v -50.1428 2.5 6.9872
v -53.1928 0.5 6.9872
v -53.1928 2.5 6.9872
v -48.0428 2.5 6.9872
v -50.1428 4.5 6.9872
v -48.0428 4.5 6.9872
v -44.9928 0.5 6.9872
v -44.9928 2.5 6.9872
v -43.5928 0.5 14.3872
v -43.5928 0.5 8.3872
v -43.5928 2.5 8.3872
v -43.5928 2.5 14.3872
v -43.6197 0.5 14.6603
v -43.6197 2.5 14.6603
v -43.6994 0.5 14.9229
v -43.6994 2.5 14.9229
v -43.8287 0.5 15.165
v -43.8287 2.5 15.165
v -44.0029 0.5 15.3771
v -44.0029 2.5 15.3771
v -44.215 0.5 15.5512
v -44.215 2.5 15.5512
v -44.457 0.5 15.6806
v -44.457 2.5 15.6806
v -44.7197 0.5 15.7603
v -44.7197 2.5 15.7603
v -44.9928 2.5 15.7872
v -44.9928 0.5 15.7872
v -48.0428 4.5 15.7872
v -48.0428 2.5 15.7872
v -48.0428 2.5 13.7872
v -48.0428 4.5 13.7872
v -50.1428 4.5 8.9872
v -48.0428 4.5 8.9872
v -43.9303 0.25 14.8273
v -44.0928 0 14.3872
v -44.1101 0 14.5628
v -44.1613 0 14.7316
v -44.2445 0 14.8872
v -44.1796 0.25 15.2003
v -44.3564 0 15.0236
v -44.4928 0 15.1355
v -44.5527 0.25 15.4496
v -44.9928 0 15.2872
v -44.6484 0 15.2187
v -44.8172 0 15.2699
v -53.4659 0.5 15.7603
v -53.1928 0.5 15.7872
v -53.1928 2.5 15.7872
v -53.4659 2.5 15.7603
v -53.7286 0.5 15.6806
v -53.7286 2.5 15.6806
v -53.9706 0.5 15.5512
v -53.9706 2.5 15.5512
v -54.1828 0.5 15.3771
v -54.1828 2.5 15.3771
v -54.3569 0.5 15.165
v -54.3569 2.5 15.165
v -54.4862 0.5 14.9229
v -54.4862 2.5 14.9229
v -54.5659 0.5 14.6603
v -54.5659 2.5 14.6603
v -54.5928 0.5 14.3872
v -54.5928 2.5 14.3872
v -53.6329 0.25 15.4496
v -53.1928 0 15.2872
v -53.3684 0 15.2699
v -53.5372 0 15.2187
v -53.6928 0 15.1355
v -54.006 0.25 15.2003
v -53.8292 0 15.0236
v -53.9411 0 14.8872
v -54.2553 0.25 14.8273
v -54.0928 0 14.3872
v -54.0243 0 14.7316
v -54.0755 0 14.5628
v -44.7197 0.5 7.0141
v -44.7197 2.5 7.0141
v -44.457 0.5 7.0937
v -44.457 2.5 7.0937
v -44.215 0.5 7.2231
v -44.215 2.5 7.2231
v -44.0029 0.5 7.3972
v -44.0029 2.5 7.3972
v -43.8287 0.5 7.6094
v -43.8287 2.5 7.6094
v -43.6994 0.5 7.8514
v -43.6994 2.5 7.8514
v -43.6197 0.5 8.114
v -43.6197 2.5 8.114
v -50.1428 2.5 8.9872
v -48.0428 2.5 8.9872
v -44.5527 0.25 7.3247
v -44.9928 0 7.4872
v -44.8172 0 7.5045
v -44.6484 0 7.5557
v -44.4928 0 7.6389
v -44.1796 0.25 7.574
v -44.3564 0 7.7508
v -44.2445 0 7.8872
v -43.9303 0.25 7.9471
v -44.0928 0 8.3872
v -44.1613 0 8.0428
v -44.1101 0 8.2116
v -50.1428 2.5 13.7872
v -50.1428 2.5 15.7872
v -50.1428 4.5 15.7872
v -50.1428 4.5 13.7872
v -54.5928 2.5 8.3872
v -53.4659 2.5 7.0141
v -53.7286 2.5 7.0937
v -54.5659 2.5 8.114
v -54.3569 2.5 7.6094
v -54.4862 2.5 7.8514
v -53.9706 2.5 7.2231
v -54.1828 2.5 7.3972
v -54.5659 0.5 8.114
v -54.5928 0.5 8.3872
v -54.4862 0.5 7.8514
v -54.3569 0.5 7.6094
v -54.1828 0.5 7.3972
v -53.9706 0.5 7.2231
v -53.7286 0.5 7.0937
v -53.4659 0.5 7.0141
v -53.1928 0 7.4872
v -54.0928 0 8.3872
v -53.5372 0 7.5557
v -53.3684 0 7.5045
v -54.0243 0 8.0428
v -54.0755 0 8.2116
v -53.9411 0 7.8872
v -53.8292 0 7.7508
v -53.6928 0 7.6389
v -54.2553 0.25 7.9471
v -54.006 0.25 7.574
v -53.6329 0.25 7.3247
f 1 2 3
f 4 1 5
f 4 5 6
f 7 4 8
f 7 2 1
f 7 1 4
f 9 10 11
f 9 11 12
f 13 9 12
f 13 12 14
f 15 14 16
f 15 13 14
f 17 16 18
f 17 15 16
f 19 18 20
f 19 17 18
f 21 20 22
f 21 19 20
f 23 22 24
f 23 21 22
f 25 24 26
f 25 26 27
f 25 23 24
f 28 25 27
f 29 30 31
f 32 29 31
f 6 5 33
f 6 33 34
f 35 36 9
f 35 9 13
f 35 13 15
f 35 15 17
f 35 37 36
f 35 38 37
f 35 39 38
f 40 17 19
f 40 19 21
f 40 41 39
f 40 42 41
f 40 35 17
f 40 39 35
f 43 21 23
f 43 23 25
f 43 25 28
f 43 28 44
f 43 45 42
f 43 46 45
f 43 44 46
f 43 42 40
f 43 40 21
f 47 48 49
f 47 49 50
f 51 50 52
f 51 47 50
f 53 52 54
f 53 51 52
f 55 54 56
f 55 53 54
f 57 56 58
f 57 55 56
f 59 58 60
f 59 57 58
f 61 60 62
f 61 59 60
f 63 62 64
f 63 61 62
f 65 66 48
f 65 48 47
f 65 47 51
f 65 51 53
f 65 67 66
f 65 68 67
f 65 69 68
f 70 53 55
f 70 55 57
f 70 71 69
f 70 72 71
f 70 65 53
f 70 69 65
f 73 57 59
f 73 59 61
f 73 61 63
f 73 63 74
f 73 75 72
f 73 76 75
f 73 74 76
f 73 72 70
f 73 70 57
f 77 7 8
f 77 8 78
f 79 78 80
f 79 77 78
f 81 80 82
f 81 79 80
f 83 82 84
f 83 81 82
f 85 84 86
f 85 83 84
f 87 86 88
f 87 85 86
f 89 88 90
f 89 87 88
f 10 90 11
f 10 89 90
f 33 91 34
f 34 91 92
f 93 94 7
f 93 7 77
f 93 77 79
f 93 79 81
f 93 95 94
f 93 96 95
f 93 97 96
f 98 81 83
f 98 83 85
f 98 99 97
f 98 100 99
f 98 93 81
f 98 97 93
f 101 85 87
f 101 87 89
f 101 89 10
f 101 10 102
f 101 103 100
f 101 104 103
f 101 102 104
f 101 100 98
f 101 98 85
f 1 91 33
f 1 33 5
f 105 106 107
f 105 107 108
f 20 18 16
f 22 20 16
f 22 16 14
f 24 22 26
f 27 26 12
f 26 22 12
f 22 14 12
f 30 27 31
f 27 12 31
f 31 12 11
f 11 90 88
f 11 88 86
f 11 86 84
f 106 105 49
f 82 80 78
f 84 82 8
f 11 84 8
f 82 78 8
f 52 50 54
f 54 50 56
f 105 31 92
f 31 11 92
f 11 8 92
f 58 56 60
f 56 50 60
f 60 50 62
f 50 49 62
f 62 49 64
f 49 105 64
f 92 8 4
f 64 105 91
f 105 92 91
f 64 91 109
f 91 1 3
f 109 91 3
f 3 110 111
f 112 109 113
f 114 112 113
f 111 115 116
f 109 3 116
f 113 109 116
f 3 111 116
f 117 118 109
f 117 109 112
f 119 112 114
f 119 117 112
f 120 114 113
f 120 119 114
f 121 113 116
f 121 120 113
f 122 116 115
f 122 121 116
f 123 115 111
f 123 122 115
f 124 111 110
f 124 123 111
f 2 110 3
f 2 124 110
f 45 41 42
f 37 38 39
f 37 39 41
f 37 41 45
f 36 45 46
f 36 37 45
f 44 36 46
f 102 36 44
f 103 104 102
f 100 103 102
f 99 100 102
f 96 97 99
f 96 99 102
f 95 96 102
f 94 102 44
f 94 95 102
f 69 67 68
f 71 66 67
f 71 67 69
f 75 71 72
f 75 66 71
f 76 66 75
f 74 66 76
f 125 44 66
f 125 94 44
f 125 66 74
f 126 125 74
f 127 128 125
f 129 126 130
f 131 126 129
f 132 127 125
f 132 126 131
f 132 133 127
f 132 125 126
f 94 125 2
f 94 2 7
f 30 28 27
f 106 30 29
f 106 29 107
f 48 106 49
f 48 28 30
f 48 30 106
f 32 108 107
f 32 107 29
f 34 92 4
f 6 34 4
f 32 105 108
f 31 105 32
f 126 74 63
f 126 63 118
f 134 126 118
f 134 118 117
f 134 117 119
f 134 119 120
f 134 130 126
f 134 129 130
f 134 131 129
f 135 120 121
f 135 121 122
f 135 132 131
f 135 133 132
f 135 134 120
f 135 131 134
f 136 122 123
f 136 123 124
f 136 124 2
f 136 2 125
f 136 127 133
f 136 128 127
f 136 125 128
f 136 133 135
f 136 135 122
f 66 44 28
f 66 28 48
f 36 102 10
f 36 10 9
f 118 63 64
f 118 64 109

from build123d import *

# Parameters (mm, degrees)
EXTRUDE_1_DEPTH = 2.5
CHAMFER_1_SIZE  = 0.5
SKETCH_2_W      = 2.1
SKETCH_2_H      = 2
EXTRUDE_2_DEPTH = 2


with BuildPart() as part:
    # 草图1 → 凸台-拉伸1 (new body)
    with BuildSketch(Plane(origin=(0, 0, 0), x_dir=(1, 0, 0), z_dir=(0, 1, 0))):
        with BuildLine():
            Line((-53.192801429, -6.98717318), (-44.992801429, -6.98717318))
            ThreePointArc((-44.992801429, -6.98717318), (-44.002851935, -7.397223687), (-43.592801429, -8.38717318))
            Line((-43.592801429, -8.38717318), (-43.592801429, -14.38717318))
            ThreePointArc((-43.592801429, -14.38717318), (-44.002851935, -15.377122674), (-44.992801429, -15.78717318))
            Line((-44.992801429, -15.78717318), (-53.192801429, -15.78717318))
            ThreePointArc((-53.192801429, -15.78717318), (-54.182750923, -15.377122674), (-54.592801429, -14.38717318))
            Line((-54.592801429, -14.38717318), (-54.592801429, -8.38717318))
            ThreePointArc((-54.592801429, -8.38717318), (-54.182750923, -7.397223687), (-53.192801429, -6.98717318))
        make_face()
    extrude(amount=EXTRUDE_1_DEPTH)

    # 倒角1
    chamfer_1_edges = [part.edges().sort_by_distance(p)[0] for p in [
        (-49.092801429, 0, 6.98717318),
        (-44.002851935, 0, 7.397223687),
        (-43.592801429, 0, 11.38717318),
        (-44.002851935, 0, 15.377122674),
        (-49.092801429, 0, 15.78717318),
        (-54.182750923, 0, 15.377122674),
        (-54.592801429, 0, 11.38717318),
        (-54.182750923, 0, 7.397223687),
    ]]
    chamfer(chamfer_1_edges, length=CHAMFER_1_SIZE)

    # 草图2 → 凸台-拉伸2 (add)
    with BuildSketch(Plane(origin=(0, 2.5, 0), x_dir=(1, 0, 0), z_dir=(0, 1, 0))):
        with Locations((-49.092801429, -7.98717318)):
            Rectangle(SKETCH_2_W, SKETCH_2_H)
        with Locations((-49.092801429, -14.78717318)):
            Rectangle(SKETCH_2_W, SKETCH_2_H)
    extrude(amount=EXTRUDE_2_DEPTH)


solid = part.part
